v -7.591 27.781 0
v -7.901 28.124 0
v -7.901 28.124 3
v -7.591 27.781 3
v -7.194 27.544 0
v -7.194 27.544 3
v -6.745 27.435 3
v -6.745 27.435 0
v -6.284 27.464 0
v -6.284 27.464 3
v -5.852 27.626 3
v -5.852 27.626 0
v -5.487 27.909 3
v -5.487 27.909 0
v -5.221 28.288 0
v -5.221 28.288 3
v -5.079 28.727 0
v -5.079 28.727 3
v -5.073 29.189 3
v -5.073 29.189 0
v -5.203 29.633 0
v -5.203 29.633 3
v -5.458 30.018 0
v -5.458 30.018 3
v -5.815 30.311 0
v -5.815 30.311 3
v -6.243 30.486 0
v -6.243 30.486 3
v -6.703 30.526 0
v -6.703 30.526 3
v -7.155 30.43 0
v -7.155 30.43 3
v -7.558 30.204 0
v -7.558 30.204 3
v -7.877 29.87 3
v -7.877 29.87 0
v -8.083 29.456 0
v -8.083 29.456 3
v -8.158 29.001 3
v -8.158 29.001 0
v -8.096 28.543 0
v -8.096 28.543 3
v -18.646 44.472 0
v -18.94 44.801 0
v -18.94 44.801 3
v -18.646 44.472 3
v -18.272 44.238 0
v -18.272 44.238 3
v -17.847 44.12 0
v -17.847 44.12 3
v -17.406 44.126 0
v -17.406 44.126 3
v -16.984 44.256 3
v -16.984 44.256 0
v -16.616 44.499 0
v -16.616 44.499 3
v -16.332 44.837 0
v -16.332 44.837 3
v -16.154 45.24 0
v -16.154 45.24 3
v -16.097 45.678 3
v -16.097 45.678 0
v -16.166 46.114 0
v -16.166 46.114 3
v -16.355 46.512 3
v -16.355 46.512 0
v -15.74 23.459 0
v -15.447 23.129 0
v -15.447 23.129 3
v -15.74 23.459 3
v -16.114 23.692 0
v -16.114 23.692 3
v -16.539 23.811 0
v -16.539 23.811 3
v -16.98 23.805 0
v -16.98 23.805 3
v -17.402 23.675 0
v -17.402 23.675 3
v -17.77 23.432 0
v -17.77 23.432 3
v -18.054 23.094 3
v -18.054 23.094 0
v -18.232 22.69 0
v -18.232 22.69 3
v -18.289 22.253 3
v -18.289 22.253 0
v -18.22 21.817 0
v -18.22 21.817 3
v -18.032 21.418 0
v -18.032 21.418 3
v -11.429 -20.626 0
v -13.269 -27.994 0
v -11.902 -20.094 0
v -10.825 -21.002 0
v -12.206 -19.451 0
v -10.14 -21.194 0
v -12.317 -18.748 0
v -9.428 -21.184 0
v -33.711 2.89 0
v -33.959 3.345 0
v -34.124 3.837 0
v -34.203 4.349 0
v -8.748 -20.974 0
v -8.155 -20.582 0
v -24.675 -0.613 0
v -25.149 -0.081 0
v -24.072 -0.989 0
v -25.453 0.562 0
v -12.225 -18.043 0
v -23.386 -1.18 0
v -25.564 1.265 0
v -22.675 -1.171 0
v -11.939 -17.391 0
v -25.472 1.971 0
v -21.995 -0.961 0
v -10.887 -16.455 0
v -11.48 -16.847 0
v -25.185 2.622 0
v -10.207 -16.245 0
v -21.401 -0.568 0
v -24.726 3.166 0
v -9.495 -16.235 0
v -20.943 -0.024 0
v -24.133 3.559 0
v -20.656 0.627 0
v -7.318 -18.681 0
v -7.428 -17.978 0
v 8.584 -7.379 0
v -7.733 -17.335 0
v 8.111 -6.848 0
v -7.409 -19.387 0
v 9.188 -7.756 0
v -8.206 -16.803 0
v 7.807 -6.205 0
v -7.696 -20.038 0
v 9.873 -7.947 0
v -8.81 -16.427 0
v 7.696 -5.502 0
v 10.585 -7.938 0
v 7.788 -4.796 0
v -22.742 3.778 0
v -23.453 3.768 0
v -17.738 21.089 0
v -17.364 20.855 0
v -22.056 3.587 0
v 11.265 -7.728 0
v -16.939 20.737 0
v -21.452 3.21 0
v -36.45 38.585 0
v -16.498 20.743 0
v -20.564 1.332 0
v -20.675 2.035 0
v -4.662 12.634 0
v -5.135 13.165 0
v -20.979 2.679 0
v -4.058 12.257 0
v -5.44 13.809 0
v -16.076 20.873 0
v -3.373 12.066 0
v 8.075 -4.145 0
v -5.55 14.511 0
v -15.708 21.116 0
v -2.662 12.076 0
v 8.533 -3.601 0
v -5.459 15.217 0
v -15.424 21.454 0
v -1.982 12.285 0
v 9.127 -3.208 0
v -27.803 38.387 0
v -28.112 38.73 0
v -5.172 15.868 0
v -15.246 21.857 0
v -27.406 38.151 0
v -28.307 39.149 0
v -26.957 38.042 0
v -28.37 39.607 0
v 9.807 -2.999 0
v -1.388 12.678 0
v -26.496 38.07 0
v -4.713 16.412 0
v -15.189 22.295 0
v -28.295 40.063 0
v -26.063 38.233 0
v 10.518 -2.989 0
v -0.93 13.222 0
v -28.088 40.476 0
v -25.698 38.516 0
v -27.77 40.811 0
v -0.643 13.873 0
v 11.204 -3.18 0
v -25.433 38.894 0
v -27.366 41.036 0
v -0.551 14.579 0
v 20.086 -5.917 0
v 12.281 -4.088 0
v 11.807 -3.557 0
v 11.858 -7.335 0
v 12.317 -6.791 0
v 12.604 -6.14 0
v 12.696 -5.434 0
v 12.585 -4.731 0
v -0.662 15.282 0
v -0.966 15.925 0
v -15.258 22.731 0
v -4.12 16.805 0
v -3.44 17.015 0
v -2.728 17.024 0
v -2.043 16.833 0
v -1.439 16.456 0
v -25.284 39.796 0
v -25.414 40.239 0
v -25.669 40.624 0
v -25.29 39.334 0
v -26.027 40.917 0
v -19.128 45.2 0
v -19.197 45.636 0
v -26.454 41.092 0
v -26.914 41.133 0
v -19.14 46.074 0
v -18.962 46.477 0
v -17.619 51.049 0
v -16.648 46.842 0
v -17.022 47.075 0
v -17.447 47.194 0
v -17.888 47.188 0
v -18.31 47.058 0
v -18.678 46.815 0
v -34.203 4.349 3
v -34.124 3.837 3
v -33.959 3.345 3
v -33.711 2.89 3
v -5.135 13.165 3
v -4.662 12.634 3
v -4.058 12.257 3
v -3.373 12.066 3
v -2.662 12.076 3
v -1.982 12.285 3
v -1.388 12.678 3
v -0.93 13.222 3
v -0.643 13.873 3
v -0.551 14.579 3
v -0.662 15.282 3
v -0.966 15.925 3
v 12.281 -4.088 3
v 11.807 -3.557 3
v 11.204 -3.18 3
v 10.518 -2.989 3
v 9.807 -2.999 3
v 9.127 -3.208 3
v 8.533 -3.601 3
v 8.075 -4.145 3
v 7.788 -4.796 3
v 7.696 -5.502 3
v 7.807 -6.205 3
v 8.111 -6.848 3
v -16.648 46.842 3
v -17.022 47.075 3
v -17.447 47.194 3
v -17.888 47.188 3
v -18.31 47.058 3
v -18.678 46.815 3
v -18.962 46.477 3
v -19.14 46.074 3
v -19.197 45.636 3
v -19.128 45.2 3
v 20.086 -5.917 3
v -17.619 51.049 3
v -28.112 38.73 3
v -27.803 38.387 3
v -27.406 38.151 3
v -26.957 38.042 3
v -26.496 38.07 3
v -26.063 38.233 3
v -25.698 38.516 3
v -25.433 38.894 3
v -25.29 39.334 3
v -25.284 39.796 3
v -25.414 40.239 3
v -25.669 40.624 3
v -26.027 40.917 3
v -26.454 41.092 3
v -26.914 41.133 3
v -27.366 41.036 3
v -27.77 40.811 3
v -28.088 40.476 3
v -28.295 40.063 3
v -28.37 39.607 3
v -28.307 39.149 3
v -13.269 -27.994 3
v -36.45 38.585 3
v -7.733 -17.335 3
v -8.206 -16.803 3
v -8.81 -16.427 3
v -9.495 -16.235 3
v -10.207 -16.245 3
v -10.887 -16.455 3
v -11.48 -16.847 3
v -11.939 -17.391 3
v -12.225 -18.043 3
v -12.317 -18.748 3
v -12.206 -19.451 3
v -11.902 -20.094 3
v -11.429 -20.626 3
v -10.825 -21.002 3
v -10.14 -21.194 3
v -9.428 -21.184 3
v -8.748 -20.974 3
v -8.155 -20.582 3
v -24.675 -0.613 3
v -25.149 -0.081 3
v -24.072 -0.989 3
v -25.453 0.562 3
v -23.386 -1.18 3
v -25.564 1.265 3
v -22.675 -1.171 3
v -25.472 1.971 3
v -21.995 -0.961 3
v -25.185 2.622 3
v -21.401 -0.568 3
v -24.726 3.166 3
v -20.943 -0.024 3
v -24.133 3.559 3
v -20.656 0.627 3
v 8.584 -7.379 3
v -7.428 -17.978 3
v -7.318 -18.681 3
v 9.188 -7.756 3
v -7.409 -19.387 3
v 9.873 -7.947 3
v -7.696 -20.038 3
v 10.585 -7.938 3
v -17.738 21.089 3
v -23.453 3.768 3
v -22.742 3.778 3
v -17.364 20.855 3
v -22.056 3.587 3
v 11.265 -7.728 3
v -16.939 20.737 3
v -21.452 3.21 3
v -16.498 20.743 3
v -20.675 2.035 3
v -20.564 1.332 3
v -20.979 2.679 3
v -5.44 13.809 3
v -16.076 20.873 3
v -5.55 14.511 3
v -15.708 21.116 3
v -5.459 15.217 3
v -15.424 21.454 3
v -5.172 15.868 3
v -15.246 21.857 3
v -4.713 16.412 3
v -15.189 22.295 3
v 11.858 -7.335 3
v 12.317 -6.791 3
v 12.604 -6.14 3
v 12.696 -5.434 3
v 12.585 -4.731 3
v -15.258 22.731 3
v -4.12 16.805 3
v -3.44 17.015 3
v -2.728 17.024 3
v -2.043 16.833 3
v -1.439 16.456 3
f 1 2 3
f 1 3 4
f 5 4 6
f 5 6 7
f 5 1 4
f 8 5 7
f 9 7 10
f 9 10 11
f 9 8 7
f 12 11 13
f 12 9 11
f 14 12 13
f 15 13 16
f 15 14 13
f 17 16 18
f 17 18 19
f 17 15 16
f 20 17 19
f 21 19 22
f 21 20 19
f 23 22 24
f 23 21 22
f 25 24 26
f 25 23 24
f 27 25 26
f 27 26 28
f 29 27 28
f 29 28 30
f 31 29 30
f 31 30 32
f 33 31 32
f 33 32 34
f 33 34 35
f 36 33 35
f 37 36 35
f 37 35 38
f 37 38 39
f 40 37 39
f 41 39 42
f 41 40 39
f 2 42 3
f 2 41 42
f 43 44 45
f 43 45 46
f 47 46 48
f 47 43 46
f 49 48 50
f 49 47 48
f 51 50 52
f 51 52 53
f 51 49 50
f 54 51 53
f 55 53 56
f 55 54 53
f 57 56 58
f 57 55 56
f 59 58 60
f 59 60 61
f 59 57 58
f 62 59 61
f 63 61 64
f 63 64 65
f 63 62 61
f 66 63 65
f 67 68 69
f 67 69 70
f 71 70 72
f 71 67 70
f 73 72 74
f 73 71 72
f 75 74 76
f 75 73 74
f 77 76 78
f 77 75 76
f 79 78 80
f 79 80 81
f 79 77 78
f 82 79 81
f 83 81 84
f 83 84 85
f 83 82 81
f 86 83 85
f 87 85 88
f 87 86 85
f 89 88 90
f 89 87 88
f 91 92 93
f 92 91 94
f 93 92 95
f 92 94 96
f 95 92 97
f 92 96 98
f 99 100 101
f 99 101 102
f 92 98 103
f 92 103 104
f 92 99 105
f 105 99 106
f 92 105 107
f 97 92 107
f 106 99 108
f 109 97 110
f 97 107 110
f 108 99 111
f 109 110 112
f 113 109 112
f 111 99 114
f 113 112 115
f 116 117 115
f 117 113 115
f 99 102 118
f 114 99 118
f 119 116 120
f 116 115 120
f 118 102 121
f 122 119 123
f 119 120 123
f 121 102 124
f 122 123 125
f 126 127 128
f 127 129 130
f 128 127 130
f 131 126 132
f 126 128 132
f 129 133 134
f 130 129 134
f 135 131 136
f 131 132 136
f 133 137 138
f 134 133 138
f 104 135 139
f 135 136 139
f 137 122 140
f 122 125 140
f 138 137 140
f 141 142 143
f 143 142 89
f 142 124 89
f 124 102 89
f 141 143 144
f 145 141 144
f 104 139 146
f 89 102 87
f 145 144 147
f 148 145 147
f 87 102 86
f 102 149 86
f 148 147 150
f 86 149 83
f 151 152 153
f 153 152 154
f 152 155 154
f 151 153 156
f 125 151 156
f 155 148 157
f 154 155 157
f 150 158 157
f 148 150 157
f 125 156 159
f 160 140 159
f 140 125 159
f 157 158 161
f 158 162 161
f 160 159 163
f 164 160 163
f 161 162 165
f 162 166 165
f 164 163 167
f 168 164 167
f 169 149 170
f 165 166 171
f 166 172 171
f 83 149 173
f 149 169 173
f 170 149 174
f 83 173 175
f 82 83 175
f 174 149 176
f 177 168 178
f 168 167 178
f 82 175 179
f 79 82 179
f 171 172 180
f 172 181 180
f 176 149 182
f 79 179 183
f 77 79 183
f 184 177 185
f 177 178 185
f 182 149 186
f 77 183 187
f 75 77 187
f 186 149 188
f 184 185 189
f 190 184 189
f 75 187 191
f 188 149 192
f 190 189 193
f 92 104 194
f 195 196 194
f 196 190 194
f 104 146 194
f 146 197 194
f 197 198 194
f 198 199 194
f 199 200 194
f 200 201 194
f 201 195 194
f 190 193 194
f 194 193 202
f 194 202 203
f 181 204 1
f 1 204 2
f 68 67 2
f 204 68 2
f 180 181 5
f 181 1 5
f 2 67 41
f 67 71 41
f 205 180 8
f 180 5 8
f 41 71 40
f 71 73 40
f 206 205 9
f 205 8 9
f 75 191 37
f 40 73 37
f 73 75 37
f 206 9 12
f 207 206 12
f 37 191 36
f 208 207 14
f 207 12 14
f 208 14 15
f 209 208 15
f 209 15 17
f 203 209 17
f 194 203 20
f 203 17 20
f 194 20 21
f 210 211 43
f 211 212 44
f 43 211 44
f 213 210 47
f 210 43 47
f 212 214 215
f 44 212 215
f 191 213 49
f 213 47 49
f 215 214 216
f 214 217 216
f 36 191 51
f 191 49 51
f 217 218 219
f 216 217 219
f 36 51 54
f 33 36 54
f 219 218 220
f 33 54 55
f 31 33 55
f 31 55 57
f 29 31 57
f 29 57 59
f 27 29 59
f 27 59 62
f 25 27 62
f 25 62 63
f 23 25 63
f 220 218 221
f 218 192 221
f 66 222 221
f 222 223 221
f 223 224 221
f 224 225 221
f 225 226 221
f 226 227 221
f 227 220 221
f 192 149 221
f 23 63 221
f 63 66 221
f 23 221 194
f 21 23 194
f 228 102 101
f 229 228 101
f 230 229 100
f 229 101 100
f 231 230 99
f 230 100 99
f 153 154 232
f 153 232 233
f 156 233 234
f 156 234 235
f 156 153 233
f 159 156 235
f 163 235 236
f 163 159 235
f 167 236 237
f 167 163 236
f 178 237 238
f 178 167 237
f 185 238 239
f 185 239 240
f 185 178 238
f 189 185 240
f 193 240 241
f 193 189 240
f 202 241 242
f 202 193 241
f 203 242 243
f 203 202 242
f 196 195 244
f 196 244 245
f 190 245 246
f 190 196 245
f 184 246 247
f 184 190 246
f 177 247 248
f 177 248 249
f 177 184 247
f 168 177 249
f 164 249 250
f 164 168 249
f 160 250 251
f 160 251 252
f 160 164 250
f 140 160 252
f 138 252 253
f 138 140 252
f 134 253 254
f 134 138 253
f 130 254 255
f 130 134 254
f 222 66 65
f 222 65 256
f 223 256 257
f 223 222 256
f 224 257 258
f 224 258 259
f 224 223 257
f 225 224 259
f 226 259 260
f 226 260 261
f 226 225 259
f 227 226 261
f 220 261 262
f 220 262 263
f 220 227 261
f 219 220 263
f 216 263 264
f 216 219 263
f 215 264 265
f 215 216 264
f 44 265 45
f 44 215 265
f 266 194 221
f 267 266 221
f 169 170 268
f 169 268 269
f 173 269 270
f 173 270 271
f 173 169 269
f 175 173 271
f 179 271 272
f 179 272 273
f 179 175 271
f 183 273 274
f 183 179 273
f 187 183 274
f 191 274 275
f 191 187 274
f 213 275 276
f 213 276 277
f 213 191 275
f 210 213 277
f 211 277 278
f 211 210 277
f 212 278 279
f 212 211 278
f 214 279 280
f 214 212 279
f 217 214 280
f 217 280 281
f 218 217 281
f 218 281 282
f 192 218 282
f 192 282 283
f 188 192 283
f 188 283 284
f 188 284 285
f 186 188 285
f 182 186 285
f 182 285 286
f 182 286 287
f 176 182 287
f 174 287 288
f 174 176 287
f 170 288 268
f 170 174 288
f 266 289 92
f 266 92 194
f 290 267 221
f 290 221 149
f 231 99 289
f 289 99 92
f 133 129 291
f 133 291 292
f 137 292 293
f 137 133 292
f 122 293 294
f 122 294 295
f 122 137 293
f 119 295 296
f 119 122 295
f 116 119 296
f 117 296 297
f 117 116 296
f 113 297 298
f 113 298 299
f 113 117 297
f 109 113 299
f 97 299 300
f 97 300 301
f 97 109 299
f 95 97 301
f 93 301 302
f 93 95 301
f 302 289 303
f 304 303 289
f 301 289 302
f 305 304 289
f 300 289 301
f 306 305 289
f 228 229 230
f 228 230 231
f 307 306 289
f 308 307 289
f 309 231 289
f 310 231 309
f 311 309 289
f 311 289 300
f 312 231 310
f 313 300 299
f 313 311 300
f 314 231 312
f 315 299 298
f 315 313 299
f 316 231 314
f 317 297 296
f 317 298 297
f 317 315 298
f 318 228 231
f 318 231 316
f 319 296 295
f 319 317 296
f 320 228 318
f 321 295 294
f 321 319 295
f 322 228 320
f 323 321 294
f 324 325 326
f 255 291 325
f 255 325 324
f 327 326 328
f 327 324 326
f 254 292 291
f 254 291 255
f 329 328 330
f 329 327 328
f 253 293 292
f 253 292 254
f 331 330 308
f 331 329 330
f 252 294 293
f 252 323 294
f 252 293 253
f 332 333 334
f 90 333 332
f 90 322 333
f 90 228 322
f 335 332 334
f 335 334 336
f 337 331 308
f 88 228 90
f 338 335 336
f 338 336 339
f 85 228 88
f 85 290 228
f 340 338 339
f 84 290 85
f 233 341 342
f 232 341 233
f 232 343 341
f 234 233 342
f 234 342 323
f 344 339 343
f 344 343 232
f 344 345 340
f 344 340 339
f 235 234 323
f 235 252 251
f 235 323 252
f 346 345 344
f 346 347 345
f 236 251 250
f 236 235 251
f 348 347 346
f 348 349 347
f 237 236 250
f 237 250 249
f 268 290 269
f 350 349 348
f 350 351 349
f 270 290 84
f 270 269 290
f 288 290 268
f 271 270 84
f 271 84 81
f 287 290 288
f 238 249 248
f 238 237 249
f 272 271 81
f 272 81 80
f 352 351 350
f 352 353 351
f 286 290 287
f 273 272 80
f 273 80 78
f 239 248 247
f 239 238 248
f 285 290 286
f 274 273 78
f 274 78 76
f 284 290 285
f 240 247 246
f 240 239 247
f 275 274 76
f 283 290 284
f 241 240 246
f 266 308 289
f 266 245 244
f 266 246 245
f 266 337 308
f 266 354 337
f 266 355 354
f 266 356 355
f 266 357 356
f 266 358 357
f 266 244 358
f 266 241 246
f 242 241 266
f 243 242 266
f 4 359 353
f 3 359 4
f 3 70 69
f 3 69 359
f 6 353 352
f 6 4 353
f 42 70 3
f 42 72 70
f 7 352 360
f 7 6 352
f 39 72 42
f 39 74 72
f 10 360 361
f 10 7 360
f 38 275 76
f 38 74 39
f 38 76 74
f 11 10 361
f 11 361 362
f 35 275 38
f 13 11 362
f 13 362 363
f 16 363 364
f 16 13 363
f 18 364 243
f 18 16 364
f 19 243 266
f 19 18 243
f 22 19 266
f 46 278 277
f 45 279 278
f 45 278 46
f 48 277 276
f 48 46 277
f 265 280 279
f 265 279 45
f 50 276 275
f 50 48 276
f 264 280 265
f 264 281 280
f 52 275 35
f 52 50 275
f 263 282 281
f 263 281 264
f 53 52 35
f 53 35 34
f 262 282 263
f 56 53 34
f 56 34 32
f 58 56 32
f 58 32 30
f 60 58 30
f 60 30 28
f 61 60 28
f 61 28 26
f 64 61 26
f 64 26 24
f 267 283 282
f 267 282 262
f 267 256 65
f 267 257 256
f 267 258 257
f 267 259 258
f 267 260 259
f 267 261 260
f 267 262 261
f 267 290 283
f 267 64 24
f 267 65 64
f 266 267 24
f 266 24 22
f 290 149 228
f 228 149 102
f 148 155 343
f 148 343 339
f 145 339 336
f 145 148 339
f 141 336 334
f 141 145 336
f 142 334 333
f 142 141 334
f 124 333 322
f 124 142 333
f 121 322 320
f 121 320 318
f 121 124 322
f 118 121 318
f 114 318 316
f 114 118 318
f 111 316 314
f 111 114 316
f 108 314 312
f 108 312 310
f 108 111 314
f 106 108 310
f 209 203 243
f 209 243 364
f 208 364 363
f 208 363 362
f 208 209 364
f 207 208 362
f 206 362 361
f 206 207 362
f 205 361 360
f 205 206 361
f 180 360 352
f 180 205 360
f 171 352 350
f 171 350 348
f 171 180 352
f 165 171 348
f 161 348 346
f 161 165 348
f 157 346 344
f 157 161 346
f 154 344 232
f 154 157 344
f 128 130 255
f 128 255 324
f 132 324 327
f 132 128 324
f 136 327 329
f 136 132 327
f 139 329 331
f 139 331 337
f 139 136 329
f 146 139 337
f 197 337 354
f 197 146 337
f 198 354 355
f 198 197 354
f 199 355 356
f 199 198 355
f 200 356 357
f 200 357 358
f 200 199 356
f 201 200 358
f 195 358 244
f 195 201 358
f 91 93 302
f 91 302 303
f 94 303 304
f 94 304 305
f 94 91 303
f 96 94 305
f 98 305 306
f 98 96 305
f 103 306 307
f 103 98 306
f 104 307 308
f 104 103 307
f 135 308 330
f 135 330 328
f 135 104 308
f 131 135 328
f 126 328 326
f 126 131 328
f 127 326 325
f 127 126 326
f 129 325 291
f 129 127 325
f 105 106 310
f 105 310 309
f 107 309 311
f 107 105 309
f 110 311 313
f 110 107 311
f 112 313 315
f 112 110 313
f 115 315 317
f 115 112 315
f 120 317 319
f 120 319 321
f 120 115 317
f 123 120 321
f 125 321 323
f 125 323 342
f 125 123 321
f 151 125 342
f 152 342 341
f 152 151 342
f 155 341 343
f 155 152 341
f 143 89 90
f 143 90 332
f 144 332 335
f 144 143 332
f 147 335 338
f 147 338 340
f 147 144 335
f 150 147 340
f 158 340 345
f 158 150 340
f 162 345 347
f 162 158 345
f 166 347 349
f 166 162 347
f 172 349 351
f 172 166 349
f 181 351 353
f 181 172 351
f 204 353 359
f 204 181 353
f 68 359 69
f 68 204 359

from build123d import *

# Parameters (mm, degrees)
EXTRUDE_1_DEPTH     = 3
CUT_EXTRUDE_1_DEPTH = 10
CUT_EXTRUDE_2_DEPTH = 10


with BuildPart() as part:
    # 草图1 → 凸台-拉伸1 (new body)
    with BuildSketch(Plane.XY):
        with BuildLine():
            Line((6.986719164, -53.161934409), (35.338837115, -34.396076908))
            ThreePointArc((35.338837115, -34.396076908), (36.622800273, -32.492523245), (36.184683625, -30.238608486))
            Line((36.184683625, -30.238608486), (-18.457077921, 52.316087899))
            ThreePointArc((-18.457077921, 52.316087899), (-20.360631584, 53.600051056), (-22.614546343, 53.161934409))
            Line((-22.614546343, 53.161934409), (-35.338837115, 44.739910071))
            ThreePointArc((-35.338837115, 44.739910071), (-36.370802739, 43.570865472), (-36.676585387, 42.041775777))
            Line((-36.676585387, 42.041775777), (-34.202704532, 4.349245051))
            ThreePointArc((-34.202704532, 4.349245051), (-34.051989945, 3.587476428), (-33.710802769, 2.889910923))
            Line((-33.710802769, 2.889910923), (2.829250742, -52.316087899))
            ThreePointArc((2.829250742, -52.316087899), (4.732804405, -53.600051056), (6.986719164, -53.161934409))
        make_face()
        with BuildLine():
            ThreePointArc((7.991481125, -42.903257428), (5.912746914, -42.480334173), (5.489823659, -44.559068384))
            ThreePointArc((5.489823659, -44.559068384), (7.56855787, -44.981991639), (7.991481125, -42.903257428))
        make_face(mode=Mode.SUBTRACT)
        with BuildLine():
            ThreePointArc((28.004740855, -29.65676978), (25.926006644, -29.233846525), (25.503083389, -31.312580736))
            ThreePointArc((25.503083389, -31.312580736), (27.5818176, -31.735503991), (28.004740855, -29.65676978))
        make_face(mode=Mode.SUBTRACT)
        with BuildLine():
            ThreePointArc((20.277623061, -17.982368271), (18.198888849, -17.559445016), (17.775965594, -19.638179227))
            ThreePointArc((17.775965594, -19.638179227), (19.854699805, -20.061102482), (20.277623061, -17.982368271))
        make_face(mode=Mode.SUBTRACT)
        with BuildLine():
            ThreePointArc((0.264363331, -31.228855919), (-1.81437088, -30.805932664), (-2.237294135, -32.884666875))
            ThreePointArc((-2.237294135, -32.884666875), (-0.158559924, -33.30759013), (0.264363331, -31.228855919))
        make_face(mode=Mode.SUBTRACT)
        with BuildLine():
            ThreePointArc((-7.732742612, -17.33474578), (-11.19729963, -16.629873689), (-11.902171722, -20.094430707))
            ThreePointArc((-11.902171722, -20.094430707), (-8.437614704, -20.799302799), (-7.732742612, -17.33474578))
        make_face(mode=Mode.SUBTRACT)
        with BuildLine():
            ThreePointArc((12.280517118, -4.088258133), (8.815960099, -3.383386041), (8.111088007, -6.84794306))
            ThreePointArc((8.111088007, -6.84794306), (11.575645026, -7.552815151), (12.280517118, -4.088258133))
        make_face(mode=Mode.SUBTRACT)
        with BuildLine():
            ThreePointArc((-20.97923026, 2.678513949), (-24.443787278, 3.383386041), (-25.14865937, -0.081170977))
            ThreePointArc((-25.14865937, -0.081170977), (-21.684102351, -0.786043069), (-20.97923026, 2.678513949))
        make_face(mode=Mode.SUBTRACT)
        with BuildLine():
            ThreePointArc((-0.96597053, 15.925001597), (-4.430527548, 16.629873689), (-5.13539964, 13.16531667))
            ThreePointArc((-5.13539964, 13.16531667), (-1.670842622, 12.460444578), (-0.96597053, 15.925001597))
        make_face(mode=Mode.SUBTRACT)
        with BuildLine():
            ThreePointArc((-5.315850745, 29.834747896), (-7.463876096, 30.271768593), (-7.900896793, 28.123743242))
            ThreePointArc((-7.900896793, 28.123743242), (-5.752871442, 27.686722545), (-5.315850745, 29.834747896))
        make_face(mode=Mode.SUBTRACT)
        with BuildLine():
            ThreePointArc((-15.446542758, 23.129389128), (-17.594568109, 23.566409825), (-18.031588806, 21.418384473))
            ThreePointArc((-18.031588806, 21.418384473), (-15.883563455, 20.981363776), (-15.446542758, 23.129389128))
        make_face(mode=Mode.SUBTRACT)
        with BuildLine():
            ThreePointArc((-16.354590451, 46.512464337), (-18.502615803, 46.949485034), (-18.9396365, 44.801459683))
            ThreePointArc((-18.9396365, 44.801459683), (-16.791611148, 44.364438986), (-16.354590451, 46.512464337))
        make_face(mode=Mode.SUBTRACT)
        with BuildLine():
            ThreePointArc((-25.527334494, 40.441157499), (-27.675359845, 40.878178196), (-28.112380542, 38.730152845))
            ThreePointArc((-28.112380542, 38.730152845), (-25.964355191, 38.293132148), (-25.527334494, 40.441157499))
        make_face(mode=Mode.SUBTRACT)
    extrude(amount=EXTRUDE_1_DEPTH)

    # 草图2 → 切除-拉伸1 (cut)
    with BuildSketch(Plane.XY.offset(3)):
        Polygon((-17.618504331, 51.049141407), (-36.449708749, 38.585039103), (-39.080293109, 42.559418534), (-20.249088692, 55.023520838), align=None)
        Polygon((22.294234295, -9.252428783), (-11.061198588, -31.329908196), (5.024024644, -55.632029551), (41.740524867, -31.329908196), align=None)
    extrude(amount=-CUT_EXTRUDE_1_DEPTH, mode=Mode.SUBTRACT)

    # 草图3 → 切除-拉伸2 (cut)
    with BuildSketch(Plane.XY.offset(3)):
        Polygon((-13.268946529, -27.994364908), (20.086486354, -5.916885495), (39.339377522, -11.508432246), (-14.131394495, -36.930591808), align=None)
    extrude(amount=-CUT_EXTRUDE_2_DEPTH, mode=Mode.SUBTRACT)


solid = part.part
